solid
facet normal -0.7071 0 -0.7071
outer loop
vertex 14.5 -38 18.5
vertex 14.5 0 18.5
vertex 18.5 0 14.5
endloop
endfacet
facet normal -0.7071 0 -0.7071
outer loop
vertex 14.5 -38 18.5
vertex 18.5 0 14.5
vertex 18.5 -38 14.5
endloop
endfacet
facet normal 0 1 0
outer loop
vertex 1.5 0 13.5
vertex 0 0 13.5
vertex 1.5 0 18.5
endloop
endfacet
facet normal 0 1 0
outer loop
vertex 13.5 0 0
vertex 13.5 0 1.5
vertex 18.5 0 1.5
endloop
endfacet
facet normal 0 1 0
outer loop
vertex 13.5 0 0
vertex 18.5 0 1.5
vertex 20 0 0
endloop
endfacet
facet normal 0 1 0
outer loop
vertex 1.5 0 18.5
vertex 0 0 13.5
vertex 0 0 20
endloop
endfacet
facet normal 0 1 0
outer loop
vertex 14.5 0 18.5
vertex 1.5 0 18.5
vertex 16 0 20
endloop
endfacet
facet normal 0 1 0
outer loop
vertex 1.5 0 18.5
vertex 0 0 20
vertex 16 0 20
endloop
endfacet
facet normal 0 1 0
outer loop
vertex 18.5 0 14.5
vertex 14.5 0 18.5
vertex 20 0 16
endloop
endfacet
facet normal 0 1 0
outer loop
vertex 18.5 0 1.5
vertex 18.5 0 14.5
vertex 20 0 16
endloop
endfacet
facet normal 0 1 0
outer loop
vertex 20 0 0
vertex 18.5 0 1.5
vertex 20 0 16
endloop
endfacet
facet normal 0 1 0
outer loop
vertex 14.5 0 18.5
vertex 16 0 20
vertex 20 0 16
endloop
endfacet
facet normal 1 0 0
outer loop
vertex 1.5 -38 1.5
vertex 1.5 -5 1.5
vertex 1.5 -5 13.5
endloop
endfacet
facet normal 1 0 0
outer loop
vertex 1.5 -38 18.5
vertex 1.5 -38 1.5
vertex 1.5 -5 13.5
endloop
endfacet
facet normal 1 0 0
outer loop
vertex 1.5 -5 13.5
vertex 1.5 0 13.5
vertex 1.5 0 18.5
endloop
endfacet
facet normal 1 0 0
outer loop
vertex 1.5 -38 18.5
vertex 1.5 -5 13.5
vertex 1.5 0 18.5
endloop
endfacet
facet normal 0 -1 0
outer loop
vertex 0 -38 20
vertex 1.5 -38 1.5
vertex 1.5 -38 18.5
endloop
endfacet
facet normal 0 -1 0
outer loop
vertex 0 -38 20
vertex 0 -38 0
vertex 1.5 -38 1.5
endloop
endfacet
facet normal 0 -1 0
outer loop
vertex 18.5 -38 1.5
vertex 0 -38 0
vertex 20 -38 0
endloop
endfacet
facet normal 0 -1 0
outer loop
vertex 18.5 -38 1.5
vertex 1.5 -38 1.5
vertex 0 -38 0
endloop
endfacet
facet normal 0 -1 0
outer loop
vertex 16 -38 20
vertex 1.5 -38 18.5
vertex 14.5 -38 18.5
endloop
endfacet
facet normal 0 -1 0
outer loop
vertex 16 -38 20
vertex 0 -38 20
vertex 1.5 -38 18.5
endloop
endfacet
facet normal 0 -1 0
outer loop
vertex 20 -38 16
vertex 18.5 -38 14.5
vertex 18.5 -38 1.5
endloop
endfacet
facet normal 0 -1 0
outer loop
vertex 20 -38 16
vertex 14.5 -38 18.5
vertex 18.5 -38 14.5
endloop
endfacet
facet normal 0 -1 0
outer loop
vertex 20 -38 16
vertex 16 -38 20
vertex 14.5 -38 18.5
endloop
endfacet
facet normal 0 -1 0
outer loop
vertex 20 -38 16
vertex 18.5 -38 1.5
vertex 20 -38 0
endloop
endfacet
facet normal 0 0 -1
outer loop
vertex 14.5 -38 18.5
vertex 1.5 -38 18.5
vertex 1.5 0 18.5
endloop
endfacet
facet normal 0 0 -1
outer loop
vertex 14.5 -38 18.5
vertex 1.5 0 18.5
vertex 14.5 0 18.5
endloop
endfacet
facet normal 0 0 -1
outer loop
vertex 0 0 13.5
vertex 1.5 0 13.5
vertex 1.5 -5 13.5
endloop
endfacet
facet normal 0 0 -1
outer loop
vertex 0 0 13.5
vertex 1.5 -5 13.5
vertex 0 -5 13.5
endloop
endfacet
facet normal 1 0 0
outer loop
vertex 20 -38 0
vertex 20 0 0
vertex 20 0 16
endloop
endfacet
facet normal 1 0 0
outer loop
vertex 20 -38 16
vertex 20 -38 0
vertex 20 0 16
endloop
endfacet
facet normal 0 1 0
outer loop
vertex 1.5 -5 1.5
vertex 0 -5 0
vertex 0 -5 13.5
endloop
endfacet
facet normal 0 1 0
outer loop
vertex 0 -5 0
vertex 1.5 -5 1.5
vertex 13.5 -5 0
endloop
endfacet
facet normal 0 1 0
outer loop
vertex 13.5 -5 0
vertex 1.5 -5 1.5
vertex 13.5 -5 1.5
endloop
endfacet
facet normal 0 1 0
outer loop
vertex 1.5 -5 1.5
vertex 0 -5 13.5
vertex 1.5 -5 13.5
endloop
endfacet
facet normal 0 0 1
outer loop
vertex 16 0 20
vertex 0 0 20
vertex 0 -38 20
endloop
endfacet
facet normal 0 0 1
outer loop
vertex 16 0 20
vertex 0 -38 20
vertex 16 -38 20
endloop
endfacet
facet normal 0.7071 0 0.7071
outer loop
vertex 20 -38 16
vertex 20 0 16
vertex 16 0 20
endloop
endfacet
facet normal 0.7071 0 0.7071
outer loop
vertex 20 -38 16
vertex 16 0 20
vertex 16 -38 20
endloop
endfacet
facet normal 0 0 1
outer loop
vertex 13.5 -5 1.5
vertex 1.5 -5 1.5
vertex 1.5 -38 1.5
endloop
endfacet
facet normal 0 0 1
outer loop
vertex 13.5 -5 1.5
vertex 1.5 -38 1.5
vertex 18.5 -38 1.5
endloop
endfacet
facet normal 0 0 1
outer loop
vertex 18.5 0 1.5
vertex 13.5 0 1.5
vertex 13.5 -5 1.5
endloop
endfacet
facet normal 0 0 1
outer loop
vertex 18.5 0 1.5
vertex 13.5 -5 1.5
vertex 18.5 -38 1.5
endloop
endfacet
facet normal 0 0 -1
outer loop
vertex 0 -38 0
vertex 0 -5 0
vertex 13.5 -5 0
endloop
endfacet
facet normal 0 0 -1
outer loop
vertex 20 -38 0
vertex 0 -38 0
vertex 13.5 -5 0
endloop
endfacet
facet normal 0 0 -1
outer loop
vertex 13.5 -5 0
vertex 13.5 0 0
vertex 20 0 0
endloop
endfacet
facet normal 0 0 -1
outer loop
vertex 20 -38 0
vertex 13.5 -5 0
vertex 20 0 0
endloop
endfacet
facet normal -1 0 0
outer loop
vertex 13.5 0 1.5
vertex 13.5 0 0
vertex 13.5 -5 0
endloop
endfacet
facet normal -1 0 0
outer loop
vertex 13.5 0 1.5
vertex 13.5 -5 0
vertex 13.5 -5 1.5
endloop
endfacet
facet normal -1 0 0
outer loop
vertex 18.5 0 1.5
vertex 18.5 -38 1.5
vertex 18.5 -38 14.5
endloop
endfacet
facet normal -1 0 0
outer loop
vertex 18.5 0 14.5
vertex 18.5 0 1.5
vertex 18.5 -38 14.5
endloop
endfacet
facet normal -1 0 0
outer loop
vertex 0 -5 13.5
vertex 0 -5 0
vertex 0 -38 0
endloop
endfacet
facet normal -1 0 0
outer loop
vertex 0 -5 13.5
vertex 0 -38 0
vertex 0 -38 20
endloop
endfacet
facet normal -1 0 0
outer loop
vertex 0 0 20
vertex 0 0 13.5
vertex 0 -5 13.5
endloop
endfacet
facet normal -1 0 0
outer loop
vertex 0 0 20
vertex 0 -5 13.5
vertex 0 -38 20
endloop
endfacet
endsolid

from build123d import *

# Parameters (mm, degrees)
F0_W     = 20
F0_H     = 20
F0_W_2   = 17
F0_H_2   = 17
F1_DEPTH = 38
F2_SIZE  = 4
F4_DEPTH = 5


with BuildPart() as f1:
    # F0 (on Front) → F1 (new body)
    with BuildSketch(Plane.XZ):
        with Locations((10, 10)):
            Rectangle(F0_W, F0_H)
        with Locations((10, 10)):
            Rectangle(F0_W_2, F0_H_2, mode=Mode.SUBTRACT)
    extrude(amount=F1_DEPTH)

    # F2
    f2_edges = [f1.edges().sort_by_distance(p)[0] for p in [
        (20, -19, 20),
        (18.5, -19, 18.5),
    ]]
    chamfer(f2_edges, length=F2_SIZE)

    # F1_face (on face) + F3 (on Front) → F4 (cut)
    with BuildSketch(Plane(origin=(9.891892, -38, 9.891892), x_dir=(1, 0, 0), z_dir=(0, -1, 0))):
        Polygon((10.108108, -9.891892), (10.108108, 6.108108), (6.108108, 10.108108), (-9.891892, 10.108108), (-9.891892, -9.891892), align=None)
        Polygon((-8.391892, 8.608108), (4.608108, 8.608108), (8.608108, 4.608108), (8.608108, -8.391892), (-8.391892, -8.391892), align=None, mode=Mode.SUBTRACT)
    with BuildSketch(Plane.XZ):
        Polygon((0, 13.5), (0, 0), (13.5, 0), (13.5, 1.5), (1.5, 1.5), (1.5, 13.5), align=None)
    extrude(amount=F4_DEPTH, mode=Mode.SUBTRACT)


solid = f1.part
